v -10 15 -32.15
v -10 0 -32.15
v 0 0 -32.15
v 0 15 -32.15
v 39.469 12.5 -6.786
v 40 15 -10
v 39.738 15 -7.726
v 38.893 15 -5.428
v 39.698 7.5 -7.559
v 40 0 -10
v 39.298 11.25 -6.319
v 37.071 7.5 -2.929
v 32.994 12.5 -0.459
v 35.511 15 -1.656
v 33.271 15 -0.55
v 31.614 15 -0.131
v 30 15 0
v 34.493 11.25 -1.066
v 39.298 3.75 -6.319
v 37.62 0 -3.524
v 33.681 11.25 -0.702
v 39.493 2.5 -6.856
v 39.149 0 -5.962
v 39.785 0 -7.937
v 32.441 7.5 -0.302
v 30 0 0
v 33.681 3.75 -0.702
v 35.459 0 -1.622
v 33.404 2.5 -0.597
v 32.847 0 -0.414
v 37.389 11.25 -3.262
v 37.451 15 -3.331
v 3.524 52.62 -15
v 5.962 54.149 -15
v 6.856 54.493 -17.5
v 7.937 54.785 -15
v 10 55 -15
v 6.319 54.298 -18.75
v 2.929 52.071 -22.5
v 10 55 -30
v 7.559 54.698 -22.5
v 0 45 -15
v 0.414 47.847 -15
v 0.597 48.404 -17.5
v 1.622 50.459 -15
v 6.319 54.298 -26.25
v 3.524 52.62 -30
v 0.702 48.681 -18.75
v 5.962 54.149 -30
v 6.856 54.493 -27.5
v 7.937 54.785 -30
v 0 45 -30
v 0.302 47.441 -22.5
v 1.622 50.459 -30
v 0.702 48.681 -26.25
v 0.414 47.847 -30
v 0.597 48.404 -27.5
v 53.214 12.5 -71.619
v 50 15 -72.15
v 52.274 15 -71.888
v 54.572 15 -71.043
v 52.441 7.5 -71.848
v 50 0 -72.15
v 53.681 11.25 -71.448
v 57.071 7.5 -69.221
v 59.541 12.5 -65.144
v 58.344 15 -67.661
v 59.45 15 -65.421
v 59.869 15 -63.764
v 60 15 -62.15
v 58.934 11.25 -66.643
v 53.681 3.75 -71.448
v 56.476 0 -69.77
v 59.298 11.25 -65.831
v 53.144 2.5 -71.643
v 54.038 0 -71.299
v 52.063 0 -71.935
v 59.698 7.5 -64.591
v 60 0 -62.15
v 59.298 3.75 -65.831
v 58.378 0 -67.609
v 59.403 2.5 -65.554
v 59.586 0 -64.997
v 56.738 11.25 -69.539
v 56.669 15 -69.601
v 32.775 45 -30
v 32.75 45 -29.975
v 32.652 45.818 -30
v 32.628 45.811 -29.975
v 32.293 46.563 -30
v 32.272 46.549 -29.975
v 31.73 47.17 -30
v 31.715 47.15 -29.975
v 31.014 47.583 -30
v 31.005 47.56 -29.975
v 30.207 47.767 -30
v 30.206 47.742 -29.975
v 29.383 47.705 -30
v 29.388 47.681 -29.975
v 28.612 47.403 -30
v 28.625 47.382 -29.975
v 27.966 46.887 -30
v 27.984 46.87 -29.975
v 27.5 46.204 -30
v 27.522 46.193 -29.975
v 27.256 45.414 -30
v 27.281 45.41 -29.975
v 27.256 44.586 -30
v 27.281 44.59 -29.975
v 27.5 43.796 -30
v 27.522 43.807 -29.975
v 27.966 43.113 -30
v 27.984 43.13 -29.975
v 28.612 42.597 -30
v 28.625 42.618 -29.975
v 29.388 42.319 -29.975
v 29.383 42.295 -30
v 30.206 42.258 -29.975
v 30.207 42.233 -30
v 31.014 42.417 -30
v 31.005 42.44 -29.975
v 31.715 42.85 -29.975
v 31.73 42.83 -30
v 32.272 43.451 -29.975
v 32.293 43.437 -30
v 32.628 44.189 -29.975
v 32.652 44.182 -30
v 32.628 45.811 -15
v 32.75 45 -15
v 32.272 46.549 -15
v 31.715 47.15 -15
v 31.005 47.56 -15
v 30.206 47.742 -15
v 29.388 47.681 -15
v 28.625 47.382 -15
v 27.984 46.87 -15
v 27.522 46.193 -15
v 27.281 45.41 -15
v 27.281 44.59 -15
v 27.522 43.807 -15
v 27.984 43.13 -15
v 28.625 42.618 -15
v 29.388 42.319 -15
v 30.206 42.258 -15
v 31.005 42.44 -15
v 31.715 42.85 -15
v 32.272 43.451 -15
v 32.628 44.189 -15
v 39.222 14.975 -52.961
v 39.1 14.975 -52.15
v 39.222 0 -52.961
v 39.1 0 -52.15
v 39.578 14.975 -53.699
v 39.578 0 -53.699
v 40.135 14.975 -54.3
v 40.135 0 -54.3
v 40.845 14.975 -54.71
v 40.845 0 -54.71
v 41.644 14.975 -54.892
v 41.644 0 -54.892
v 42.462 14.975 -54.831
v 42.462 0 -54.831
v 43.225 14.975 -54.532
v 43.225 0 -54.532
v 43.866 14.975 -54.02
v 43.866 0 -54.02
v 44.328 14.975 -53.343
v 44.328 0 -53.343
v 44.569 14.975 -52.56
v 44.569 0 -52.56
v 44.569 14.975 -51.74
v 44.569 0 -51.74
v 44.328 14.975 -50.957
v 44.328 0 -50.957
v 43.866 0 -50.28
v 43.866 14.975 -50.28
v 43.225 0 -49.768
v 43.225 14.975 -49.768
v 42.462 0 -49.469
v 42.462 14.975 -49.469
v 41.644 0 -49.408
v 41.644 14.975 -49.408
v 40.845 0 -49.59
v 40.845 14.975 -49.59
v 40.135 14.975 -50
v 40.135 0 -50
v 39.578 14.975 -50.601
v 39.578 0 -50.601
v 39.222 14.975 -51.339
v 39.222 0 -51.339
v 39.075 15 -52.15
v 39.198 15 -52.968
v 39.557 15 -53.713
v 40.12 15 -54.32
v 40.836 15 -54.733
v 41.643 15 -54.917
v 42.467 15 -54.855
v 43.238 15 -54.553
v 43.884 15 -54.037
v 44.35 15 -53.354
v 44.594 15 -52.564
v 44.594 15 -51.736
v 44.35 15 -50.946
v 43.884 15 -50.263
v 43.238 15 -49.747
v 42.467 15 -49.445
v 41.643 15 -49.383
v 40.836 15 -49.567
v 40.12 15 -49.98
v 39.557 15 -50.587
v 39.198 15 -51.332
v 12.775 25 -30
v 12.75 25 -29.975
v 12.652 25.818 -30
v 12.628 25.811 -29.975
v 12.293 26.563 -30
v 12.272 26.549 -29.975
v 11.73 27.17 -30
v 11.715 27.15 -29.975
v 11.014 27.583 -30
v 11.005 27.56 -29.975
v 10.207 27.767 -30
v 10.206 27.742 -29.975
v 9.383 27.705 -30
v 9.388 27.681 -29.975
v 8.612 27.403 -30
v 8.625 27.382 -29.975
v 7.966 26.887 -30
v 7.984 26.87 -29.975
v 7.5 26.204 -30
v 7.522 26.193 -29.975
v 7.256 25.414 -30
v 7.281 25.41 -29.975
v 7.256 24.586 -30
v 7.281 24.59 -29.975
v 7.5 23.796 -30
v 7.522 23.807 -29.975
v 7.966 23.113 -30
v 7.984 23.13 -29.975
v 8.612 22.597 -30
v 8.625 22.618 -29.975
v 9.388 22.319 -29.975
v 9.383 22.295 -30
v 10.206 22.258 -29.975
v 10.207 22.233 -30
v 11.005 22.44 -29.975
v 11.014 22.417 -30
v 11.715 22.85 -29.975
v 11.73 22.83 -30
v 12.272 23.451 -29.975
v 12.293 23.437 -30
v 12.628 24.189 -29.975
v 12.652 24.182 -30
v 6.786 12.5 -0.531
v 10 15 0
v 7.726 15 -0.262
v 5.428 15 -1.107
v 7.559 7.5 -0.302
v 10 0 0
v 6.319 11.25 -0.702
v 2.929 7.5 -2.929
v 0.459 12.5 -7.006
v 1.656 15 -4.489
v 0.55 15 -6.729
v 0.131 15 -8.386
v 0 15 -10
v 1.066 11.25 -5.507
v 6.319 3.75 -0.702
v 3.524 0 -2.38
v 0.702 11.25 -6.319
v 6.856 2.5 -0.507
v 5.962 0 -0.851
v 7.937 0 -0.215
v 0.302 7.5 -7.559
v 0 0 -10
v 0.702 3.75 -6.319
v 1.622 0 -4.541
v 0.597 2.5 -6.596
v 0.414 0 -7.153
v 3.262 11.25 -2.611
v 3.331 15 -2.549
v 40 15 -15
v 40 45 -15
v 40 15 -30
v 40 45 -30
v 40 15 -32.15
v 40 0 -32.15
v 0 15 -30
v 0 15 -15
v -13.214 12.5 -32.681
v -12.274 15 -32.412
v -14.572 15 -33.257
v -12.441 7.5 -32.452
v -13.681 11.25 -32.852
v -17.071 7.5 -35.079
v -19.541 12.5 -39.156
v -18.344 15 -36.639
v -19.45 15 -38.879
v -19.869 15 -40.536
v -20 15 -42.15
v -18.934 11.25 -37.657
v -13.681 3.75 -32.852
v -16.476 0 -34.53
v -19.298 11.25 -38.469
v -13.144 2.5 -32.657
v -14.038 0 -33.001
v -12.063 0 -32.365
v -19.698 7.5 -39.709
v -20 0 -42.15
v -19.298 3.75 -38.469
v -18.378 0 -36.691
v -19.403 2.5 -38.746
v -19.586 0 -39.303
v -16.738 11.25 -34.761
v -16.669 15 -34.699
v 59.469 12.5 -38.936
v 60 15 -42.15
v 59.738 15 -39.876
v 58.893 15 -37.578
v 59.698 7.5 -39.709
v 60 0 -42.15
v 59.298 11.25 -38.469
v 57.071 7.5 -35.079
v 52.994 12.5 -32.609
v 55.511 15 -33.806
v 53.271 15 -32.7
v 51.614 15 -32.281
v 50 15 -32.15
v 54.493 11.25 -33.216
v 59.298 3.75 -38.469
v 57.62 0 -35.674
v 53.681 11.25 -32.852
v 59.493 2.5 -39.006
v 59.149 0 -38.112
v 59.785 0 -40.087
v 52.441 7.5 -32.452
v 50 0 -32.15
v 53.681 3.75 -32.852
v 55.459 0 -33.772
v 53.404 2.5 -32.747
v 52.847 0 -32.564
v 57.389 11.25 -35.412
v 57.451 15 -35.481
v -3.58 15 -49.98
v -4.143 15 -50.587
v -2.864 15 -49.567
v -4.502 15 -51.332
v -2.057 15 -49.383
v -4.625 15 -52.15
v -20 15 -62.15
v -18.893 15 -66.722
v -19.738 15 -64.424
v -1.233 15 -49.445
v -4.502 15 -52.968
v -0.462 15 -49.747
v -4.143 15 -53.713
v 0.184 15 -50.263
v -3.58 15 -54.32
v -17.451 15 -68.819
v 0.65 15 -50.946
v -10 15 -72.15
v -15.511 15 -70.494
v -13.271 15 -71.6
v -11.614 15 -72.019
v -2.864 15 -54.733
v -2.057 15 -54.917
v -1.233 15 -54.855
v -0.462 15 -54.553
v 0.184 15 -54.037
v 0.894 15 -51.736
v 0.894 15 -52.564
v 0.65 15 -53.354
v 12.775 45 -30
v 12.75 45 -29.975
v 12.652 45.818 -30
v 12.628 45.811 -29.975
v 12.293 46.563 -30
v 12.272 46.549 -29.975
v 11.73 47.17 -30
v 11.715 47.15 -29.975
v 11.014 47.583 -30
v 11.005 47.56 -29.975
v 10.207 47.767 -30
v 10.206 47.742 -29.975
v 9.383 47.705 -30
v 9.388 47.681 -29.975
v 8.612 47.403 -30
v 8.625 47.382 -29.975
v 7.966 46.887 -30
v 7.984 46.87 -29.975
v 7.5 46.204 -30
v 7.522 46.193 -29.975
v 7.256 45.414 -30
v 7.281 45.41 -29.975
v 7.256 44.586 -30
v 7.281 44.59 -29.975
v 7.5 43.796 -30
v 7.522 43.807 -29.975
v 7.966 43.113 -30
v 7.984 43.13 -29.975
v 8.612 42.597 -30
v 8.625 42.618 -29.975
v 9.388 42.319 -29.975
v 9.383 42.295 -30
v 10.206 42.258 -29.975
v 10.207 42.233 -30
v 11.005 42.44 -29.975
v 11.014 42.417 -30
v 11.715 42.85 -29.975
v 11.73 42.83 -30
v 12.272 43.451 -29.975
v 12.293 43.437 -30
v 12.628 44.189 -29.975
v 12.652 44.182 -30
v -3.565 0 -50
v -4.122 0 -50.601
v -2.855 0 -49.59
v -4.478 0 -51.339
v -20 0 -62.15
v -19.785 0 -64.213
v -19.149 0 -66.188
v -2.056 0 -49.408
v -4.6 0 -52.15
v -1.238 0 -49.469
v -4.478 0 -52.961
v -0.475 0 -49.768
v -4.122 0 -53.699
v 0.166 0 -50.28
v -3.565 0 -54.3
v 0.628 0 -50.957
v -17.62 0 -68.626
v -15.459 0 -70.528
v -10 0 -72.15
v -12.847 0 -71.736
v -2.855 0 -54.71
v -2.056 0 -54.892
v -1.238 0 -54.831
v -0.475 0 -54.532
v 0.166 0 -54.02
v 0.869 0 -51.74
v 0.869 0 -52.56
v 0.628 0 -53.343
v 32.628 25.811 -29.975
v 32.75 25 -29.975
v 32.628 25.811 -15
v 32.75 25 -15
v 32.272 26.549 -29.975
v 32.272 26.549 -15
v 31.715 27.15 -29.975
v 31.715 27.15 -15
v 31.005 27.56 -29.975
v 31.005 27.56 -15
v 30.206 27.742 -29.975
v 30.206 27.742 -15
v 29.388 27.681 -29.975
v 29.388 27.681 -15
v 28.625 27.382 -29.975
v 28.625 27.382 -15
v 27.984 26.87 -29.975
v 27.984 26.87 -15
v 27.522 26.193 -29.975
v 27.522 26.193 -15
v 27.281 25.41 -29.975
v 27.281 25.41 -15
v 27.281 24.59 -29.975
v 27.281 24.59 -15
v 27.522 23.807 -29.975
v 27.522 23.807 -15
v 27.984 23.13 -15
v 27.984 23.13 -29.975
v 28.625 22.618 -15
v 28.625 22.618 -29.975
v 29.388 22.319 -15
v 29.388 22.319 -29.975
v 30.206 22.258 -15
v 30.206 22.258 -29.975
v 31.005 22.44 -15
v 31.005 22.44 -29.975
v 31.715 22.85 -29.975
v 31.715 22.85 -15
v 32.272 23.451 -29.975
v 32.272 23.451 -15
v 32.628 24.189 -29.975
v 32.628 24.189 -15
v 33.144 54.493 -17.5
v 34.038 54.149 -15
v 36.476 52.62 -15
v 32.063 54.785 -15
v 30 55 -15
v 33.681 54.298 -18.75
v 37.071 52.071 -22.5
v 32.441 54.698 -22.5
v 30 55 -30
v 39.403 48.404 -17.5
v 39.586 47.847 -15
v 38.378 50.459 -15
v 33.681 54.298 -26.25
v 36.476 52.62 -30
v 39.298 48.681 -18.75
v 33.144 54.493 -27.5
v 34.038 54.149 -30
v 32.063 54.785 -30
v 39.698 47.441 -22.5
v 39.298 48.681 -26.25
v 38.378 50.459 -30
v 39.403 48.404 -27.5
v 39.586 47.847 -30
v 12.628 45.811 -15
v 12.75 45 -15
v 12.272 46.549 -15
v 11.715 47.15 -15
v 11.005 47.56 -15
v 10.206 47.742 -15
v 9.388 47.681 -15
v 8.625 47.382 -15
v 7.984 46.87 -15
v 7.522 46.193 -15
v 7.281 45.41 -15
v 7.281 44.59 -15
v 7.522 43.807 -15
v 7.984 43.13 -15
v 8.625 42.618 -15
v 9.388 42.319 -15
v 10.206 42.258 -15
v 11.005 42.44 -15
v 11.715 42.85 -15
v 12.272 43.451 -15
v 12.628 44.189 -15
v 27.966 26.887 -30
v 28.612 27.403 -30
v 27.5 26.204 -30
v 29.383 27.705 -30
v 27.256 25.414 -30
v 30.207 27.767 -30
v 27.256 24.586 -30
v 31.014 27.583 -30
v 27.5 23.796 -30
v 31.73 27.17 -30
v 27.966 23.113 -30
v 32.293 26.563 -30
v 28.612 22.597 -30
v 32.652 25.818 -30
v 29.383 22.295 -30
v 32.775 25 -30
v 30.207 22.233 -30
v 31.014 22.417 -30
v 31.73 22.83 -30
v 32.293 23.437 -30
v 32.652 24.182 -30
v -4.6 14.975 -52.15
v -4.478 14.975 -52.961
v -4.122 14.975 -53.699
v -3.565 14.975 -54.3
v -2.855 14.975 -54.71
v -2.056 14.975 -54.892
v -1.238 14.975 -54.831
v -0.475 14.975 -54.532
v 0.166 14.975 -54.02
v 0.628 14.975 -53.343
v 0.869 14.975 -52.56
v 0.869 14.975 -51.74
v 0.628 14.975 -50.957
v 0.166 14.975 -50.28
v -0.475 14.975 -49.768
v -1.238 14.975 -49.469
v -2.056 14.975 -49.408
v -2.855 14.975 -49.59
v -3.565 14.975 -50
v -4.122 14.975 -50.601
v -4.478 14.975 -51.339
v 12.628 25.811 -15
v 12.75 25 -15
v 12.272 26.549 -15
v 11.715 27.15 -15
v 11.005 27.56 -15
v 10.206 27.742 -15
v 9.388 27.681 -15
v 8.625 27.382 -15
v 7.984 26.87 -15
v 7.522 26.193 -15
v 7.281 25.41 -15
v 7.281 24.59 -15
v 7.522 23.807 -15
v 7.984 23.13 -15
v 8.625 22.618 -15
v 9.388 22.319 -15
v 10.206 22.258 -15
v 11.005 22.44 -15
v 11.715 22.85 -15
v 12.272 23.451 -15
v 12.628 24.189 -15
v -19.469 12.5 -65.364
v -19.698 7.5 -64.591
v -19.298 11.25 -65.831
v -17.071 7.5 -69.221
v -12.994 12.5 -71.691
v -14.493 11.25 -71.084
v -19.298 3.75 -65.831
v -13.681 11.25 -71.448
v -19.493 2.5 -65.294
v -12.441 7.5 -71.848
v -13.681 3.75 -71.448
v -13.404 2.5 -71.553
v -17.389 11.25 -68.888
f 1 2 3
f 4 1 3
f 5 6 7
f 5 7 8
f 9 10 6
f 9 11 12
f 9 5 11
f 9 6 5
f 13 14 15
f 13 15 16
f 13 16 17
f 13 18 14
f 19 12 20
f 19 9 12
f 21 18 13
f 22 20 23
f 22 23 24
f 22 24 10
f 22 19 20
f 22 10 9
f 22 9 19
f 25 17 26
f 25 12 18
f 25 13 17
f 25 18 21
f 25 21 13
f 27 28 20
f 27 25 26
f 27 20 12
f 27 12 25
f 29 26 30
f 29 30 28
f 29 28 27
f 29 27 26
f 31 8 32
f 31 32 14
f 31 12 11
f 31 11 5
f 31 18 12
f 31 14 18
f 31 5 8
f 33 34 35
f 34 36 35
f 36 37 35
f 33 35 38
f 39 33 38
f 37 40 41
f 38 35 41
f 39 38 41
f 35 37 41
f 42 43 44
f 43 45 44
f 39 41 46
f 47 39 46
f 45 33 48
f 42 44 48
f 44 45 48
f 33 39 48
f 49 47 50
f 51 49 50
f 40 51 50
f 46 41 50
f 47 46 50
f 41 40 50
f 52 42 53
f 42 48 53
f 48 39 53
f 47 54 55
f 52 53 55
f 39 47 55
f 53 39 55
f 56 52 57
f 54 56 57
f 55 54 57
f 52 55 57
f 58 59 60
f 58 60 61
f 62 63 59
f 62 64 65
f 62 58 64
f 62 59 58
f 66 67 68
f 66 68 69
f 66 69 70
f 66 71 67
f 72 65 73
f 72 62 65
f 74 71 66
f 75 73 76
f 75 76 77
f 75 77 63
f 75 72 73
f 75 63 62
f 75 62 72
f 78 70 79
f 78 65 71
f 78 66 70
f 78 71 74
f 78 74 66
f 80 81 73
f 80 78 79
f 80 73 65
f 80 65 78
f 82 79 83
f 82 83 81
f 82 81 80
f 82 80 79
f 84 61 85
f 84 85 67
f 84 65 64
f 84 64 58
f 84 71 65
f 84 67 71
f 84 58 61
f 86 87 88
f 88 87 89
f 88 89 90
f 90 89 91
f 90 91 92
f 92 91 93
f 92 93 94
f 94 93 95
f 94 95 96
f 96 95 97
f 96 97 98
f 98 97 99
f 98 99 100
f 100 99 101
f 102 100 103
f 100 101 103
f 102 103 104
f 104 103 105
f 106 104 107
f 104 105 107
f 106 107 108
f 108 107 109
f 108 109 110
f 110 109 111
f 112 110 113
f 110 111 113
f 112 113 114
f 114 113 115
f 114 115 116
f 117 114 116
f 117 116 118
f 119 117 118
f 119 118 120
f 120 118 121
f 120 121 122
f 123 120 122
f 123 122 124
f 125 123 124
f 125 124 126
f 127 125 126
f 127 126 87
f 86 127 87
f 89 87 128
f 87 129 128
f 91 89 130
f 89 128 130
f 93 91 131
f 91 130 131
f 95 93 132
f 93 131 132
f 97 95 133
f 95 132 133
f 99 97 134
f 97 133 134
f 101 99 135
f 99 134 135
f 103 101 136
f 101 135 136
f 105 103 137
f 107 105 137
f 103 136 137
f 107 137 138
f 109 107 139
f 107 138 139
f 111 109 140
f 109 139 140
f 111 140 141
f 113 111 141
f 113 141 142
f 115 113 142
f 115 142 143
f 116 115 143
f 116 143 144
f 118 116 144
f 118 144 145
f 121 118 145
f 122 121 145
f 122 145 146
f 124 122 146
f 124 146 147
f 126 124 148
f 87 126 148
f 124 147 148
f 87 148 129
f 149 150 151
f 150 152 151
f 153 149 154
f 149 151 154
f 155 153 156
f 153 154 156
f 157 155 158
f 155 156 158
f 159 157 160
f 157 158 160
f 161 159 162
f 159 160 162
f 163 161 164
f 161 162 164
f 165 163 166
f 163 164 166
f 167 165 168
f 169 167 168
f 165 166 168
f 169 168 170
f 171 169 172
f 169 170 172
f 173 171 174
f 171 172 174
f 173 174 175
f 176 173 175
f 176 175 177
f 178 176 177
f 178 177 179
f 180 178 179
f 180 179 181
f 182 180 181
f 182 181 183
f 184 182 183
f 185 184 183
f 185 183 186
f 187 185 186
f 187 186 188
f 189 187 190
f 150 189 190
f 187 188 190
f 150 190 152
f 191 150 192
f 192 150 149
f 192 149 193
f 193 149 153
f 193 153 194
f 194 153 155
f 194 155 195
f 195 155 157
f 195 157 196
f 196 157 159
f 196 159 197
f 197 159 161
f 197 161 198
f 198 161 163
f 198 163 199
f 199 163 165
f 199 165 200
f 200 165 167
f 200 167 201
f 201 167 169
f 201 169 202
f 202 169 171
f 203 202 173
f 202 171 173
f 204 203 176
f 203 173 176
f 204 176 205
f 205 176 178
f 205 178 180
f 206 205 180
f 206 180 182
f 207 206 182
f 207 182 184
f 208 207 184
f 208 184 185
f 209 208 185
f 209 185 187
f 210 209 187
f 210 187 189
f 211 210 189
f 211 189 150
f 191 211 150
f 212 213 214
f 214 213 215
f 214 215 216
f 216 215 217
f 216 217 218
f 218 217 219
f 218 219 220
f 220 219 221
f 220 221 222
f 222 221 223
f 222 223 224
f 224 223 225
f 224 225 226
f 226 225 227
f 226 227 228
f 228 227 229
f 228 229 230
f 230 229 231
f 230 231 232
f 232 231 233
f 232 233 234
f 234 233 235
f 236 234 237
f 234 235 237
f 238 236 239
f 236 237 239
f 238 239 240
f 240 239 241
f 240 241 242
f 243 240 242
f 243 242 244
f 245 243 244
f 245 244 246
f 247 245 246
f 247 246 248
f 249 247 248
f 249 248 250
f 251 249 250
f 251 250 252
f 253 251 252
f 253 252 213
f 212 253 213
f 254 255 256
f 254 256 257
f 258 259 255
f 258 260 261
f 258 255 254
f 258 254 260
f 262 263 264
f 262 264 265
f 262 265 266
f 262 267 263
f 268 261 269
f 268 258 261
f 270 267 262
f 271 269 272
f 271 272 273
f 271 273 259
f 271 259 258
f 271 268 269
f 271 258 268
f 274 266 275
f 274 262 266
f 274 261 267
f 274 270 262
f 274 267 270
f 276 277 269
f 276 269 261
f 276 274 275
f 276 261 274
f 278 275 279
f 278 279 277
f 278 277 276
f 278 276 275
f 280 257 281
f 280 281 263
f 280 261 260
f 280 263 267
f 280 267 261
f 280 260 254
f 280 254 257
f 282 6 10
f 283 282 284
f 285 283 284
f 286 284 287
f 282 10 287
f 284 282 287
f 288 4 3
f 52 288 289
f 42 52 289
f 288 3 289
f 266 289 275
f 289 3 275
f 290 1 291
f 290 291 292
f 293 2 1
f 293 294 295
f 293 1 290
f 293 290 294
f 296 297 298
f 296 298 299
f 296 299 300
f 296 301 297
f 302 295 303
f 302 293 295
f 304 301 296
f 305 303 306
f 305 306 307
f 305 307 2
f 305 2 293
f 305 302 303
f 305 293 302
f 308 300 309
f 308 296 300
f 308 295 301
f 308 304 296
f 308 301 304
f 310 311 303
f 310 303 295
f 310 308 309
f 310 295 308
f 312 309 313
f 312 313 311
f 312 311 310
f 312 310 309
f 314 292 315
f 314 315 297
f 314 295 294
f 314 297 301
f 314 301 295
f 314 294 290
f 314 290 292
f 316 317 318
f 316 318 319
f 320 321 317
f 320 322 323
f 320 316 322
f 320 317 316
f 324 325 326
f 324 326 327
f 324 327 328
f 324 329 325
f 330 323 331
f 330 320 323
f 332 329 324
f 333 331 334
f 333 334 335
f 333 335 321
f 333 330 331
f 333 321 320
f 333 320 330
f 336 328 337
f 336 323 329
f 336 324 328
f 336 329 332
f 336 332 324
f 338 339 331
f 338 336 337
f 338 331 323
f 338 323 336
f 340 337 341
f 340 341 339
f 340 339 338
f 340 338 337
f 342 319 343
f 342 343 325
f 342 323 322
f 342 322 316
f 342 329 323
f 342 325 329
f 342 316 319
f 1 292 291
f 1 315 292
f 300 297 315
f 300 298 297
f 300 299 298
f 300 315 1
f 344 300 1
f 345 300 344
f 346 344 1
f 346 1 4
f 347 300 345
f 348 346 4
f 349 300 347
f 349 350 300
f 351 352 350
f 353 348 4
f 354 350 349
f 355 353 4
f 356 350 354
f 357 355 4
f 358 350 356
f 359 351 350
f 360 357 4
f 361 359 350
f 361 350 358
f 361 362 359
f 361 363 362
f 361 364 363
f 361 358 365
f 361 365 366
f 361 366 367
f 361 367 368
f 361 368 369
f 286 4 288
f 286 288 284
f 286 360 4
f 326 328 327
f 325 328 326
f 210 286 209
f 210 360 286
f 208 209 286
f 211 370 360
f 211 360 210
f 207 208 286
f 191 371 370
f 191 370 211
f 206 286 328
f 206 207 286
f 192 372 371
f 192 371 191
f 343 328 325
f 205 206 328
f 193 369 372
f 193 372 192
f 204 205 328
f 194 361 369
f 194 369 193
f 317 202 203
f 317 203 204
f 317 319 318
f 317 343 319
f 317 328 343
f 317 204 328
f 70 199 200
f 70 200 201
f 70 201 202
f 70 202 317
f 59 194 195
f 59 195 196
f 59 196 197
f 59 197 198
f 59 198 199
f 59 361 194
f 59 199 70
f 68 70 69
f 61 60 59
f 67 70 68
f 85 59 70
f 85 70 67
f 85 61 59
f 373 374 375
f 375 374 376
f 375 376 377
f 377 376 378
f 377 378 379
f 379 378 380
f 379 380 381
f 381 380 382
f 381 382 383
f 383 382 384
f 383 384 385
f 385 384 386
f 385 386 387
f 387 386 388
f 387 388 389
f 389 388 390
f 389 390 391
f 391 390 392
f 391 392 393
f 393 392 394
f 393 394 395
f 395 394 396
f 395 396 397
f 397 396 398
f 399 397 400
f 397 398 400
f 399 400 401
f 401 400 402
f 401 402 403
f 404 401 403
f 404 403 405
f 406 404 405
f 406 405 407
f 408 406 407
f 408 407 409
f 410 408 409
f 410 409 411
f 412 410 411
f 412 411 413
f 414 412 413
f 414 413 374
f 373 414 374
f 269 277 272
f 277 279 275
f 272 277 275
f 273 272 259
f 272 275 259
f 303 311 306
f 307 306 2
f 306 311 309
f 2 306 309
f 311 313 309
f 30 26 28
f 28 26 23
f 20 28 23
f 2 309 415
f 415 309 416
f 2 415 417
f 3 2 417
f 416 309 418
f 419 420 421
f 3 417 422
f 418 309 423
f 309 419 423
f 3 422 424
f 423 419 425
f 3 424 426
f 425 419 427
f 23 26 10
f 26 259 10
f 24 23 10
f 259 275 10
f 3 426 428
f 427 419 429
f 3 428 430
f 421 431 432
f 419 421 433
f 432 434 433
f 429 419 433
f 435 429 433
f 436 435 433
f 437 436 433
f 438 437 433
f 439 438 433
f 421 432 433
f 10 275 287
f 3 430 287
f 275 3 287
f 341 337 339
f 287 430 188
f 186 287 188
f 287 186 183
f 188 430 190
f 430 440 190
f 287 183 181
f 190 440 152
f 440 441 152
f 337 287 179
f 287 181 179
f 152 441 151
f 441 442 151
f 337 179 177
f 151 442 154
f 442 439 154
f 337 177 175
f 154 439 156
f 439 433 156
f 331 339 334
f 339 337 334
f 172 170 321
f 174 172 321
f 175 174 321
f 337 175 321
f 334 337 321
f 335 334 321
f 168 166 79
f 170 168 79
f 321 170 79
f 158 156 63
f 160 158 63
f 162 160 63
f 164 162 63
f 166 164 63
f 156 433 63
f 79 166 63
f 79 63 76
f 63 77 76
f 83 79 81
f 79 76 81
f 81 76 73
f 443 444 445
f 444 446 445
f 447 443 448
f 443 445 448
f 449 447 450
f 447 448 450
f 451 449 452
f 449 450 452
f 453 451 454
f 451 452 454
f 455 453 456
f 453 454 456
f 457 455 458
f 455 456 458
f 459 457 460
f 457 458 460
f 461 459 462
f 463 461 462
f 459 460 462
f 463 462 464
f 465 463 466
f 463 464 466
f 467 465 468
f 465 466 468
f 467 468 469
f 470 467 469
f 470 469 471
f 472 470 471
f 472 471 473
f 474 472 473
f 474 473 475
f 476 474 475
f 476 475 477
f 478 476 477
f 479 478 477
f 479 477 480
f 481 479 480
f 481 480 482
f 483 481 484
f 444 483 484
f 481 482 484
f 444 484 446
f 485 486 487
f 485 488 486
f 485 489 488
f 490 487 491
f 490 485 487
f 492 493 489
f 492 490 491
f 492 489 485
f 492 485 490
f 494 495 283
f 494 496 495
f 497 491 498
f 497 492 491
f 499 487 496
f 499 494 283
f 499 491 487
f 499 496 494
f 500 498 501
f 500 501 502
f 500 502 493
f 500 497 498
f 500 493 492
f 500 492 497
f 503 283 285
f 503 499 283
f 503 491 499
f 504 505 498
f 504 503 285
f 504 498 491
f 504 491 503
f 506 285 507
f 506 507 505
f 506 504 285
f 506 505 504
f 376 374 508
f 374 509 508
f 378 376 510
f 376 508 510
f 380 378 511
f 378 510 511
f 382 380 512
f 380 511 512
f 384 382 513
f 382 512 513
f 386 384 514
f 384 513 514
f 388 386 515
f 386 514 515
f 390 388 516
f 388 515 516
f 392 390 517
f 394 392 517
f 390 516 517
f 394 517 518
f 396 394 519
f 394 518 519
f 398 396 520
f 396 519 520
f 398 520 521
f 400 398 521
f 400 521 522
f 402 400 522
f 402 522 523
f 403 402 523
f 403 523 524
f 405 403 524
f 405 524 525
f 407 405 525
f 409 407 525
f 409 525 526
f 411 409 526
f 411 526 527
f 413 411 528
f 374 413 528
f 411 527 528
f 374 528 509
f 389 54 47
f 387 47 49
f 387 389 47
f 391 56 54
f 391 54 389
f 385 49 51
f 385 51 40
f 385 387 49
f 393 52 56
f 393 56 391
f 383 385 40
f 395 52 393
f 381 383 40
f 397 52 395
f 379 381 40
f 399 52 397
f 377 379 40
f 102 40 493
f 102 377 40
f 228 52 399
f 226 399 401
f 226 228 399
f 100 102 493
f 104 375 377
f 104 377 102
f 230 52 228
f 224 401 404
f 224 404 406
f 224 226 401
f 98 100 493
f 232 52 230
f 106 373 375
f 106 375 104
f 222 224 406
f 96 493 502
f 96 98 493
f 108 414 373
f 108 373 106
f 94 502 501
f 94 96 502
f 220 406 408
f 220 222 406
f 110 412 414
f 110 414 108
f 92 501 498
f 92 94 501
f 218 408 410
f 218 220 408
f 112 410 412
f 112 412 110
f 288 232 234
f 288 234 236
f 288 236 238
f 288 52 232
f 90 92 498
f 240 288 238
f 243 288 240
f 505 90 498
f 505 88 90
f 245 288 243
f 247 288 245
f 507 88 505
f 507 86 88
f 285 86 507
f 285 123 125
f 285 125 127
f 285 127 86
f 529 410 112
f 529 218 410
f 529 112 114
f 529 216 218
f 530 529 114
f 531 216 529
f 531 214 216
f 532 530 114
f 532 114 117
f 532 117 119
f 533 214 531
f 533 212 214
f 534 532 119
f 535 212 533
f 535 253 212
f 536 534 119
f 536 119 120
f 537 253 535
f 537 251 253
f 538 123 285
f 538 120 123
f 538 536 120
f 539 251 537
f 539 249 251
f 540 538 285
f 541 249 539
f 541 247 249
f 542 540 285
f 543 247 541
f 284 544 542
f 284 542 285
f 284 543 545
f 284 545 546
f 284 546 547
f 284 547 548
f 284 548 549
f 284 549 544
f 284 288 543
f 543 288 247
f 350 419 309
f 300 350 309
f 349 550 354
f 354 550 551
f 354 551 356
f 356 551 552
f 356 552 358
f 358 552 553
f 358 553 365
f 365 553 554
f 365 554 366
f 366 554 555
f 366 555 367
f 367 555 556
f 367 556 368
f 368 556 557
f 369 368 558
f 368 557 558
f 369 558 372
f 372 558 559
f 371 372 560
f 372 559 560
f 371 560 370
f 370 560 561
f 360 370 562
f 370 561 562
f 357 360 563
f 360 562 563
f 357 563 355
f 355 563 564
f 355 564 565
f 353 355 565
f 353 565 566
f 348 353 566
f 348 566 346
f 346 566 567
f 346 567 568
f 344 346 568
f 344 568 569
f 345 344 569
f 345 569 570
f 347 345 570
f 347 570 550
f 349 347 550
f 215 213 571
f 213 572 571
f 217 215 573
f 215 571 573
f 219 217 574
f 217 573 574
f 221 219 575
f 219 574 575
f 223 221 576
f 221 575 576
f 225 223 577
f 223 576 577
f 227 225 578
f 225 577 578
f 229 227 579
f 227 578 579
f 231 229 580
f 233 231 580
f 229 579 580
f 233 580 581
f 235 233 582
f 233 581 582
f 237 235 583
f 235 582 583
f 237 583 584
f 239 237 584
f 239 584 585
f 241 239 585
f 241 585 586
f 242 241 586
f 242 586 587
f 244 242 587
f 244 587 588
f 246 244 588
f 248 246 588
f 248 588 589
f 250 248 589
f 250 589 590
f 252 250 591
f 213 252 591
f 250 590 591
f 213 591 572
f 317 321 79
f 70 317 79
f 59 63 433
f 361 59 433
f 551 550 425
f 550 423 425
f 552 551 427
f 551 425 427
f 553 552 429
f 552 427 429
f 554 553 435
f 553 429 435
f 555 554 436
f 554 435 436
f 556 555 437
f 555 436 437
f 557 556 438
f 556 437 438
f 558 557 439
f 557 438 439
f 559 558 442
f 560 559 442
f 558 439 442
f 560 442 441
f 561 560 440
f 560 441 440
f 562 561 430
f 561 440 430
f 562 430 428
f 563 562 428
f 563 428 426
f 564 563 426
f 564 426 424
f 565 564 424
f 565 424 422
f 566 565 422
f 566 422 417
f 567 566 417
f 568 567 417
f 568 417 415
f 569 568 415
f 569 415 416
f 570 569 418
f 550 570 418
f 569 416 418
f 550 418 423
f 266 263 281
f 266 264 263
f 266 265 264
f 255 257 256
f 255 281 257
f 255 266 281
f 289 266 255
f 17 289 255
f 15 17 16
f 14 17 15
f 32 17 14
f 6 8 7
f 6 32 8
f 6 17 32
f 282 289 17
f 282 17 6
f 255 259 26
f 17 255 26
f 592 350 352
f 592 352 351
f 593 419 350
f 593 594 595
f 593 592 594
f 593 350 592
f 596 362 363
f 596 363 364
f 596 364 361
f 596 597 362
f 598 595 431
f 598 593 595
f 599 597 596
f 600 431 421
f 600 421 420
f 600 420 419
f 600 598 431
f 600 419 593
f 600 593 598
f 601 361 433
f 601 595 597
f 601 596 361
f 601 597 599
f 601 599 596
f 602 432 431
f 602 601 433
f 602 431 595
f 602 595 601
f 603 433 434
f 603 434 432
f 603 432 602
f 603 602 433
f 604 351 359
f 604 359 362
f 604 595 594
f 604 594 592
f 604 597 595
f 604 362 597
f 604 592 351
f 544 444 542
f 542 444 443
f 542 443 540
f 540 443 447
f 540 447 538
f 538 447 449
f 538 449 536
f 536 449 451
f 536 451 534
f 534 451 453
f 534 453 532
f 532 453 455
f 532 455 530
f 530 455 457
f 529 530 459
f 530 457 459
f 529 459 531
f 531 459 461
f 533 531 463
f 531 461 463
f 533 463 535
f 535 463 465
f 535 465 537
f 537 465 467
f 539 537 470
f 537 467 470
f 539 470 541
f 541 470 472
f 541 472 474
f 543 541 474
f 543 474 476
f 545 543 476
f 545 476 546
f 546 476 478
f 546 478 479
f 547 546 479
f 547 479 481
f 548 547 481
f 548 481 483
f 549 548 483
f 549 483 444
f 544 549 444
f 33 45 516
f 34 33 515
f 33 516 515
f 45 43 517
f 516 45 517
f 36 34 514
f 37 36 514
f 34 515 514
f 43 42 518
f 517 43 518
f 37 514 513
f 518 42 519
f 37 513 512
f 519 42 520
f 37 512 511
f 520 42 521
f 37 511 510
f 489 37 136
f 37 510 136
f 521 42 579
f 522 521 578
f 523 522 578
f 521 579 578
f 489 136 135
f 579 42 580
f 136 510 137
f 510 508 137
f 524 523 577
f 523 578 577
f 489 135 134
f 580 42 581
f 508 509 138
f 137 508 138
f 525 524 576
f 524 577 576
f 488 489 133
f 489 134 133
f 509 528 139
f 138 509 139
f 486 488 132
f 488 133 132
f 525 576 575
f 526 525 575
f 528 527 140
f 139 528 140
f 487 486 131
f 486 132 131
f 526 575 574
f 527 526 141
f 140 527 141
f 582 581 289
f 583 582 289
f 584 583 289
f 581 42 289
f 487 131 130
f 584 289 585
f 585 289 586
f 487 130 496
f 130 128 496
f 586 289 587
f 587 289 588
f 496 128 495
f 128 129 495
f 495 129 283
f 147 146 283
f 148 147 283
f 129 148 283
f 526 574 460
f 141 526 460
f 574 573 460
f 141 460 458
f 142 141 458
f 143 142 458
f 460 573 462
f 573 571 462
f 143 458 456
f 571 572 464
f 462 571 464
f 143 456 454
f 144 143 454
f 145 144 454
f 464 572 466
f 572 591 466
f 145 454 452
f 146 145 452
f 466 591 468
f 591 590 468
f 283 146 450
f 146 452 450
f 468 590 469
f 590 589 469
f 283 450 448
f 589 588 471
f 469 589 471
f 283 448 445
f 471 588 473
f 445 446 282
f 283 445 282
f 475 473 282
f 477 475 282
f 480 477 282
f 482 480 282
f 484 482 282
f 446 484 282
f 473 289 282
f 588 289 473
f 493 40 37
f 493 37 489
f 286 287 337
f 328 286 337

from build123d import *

# Parameters (mm, degrees)
BOSS_EXTRUDE1_DEPTH            = 15
M5_CLEARANCE_HOLE1_D           = 5.5
M5_CLEARANCE_HOLE1_CSINK_D     = 5.55
M5_CLEARANCE_HOLE1_CSINK_ANGLE = 90
SKETCH8_W                      = 40
SKETCH8_H                      = 15
BOSS_EXTRUDE2_DEPTH            = 40
M5_CLEARANCE_HOLE2_D           = 5.5
M5_CLEARANCE_HOLE2_CSINK_D     = 5.55
M5_CLEARANCE_HOLE2_CSINK_ANGLE = 90
FILLET2_R                      = 10


with BuildPart() as part:
    # Sketch1 → Boss-Extrude1 (new body)
    with BuildSketch(Plane(origin=(0, 0, 0), x_dir=(1, 0, 0), z_dir=(0, 1, 0))):
        Polygon((0, 32.15), (0, 0), (40, 0), (40, 32.15), (60, 32.15), (60, 72.15), (-20, 72.15), (-20, 32.15), align=None)
    extrude(amount=BOSS_EXTRUDE1_DEPTH)

    # M5 Clearance Hole1 (through all)
    with Locations(Plane(origin=(0, 15, 0), x_dir=(1, 0, 0), z_dir=(0, 1, 0))):
        with Locations((-1.85, 52.15), (41.85, 52.15)):
            CounterSinkHole(M5_CLEARANCE_HOLE1_D / 2, M5_CLEARANCE_HOLE1_CSINK_D / 2, counter_sink_angle=M5_CLEARANCE_HOLE1_CSINK_ANGLE)

    # Sketch8 → Boss-Extrude2 (add)
    with BuildSketch(Plane(origin=(0, 15, 0), x_dir=(1, 0, 0), z_dir=(0, 1, 0))):
        with Locations((20, 22.5)):
            Rectangle(SKETCH8_W, SKETCH8_H)
    extrude(amount=BOSS_EXTRUDE2_DEPTH)

    # M5 Clearance Hole2 (through all)
    with Locations(Plane(origin=(0, 0, -30), x_dir=(-1, 0, 0), z_dir=(0, 0, -1))):
        with Locations((-10, 25), (-30, 45), (-30, 25), (-10, 45)):
            CounterSinkHole(M5_CLEARANCE_HOLE2_D / 2, M5_CLEARANCE_HOLE2_CSINK_D / 2, counter_sink_angle=M5_CLEARANCE_HOLE2_CSINK_ANGLE)

    # Fillet2
    fillet2_edges = [part.edges().sort_by_distance(p)[0] for p in [
        (40, 55, -22.5),
        (0, 55, -22.5),
        (-20, 7.5, -32.15),
        (0, 7.5, 0),
        (40, 7.5, 0),
        (60, 7.5, -32.15),
        (60, 7.5, -72.15),
        (-20, 7.5, -72.15),
    ]]
    fillet(fillet2_edges, radius=FILLET2_R)


solid = part.part
